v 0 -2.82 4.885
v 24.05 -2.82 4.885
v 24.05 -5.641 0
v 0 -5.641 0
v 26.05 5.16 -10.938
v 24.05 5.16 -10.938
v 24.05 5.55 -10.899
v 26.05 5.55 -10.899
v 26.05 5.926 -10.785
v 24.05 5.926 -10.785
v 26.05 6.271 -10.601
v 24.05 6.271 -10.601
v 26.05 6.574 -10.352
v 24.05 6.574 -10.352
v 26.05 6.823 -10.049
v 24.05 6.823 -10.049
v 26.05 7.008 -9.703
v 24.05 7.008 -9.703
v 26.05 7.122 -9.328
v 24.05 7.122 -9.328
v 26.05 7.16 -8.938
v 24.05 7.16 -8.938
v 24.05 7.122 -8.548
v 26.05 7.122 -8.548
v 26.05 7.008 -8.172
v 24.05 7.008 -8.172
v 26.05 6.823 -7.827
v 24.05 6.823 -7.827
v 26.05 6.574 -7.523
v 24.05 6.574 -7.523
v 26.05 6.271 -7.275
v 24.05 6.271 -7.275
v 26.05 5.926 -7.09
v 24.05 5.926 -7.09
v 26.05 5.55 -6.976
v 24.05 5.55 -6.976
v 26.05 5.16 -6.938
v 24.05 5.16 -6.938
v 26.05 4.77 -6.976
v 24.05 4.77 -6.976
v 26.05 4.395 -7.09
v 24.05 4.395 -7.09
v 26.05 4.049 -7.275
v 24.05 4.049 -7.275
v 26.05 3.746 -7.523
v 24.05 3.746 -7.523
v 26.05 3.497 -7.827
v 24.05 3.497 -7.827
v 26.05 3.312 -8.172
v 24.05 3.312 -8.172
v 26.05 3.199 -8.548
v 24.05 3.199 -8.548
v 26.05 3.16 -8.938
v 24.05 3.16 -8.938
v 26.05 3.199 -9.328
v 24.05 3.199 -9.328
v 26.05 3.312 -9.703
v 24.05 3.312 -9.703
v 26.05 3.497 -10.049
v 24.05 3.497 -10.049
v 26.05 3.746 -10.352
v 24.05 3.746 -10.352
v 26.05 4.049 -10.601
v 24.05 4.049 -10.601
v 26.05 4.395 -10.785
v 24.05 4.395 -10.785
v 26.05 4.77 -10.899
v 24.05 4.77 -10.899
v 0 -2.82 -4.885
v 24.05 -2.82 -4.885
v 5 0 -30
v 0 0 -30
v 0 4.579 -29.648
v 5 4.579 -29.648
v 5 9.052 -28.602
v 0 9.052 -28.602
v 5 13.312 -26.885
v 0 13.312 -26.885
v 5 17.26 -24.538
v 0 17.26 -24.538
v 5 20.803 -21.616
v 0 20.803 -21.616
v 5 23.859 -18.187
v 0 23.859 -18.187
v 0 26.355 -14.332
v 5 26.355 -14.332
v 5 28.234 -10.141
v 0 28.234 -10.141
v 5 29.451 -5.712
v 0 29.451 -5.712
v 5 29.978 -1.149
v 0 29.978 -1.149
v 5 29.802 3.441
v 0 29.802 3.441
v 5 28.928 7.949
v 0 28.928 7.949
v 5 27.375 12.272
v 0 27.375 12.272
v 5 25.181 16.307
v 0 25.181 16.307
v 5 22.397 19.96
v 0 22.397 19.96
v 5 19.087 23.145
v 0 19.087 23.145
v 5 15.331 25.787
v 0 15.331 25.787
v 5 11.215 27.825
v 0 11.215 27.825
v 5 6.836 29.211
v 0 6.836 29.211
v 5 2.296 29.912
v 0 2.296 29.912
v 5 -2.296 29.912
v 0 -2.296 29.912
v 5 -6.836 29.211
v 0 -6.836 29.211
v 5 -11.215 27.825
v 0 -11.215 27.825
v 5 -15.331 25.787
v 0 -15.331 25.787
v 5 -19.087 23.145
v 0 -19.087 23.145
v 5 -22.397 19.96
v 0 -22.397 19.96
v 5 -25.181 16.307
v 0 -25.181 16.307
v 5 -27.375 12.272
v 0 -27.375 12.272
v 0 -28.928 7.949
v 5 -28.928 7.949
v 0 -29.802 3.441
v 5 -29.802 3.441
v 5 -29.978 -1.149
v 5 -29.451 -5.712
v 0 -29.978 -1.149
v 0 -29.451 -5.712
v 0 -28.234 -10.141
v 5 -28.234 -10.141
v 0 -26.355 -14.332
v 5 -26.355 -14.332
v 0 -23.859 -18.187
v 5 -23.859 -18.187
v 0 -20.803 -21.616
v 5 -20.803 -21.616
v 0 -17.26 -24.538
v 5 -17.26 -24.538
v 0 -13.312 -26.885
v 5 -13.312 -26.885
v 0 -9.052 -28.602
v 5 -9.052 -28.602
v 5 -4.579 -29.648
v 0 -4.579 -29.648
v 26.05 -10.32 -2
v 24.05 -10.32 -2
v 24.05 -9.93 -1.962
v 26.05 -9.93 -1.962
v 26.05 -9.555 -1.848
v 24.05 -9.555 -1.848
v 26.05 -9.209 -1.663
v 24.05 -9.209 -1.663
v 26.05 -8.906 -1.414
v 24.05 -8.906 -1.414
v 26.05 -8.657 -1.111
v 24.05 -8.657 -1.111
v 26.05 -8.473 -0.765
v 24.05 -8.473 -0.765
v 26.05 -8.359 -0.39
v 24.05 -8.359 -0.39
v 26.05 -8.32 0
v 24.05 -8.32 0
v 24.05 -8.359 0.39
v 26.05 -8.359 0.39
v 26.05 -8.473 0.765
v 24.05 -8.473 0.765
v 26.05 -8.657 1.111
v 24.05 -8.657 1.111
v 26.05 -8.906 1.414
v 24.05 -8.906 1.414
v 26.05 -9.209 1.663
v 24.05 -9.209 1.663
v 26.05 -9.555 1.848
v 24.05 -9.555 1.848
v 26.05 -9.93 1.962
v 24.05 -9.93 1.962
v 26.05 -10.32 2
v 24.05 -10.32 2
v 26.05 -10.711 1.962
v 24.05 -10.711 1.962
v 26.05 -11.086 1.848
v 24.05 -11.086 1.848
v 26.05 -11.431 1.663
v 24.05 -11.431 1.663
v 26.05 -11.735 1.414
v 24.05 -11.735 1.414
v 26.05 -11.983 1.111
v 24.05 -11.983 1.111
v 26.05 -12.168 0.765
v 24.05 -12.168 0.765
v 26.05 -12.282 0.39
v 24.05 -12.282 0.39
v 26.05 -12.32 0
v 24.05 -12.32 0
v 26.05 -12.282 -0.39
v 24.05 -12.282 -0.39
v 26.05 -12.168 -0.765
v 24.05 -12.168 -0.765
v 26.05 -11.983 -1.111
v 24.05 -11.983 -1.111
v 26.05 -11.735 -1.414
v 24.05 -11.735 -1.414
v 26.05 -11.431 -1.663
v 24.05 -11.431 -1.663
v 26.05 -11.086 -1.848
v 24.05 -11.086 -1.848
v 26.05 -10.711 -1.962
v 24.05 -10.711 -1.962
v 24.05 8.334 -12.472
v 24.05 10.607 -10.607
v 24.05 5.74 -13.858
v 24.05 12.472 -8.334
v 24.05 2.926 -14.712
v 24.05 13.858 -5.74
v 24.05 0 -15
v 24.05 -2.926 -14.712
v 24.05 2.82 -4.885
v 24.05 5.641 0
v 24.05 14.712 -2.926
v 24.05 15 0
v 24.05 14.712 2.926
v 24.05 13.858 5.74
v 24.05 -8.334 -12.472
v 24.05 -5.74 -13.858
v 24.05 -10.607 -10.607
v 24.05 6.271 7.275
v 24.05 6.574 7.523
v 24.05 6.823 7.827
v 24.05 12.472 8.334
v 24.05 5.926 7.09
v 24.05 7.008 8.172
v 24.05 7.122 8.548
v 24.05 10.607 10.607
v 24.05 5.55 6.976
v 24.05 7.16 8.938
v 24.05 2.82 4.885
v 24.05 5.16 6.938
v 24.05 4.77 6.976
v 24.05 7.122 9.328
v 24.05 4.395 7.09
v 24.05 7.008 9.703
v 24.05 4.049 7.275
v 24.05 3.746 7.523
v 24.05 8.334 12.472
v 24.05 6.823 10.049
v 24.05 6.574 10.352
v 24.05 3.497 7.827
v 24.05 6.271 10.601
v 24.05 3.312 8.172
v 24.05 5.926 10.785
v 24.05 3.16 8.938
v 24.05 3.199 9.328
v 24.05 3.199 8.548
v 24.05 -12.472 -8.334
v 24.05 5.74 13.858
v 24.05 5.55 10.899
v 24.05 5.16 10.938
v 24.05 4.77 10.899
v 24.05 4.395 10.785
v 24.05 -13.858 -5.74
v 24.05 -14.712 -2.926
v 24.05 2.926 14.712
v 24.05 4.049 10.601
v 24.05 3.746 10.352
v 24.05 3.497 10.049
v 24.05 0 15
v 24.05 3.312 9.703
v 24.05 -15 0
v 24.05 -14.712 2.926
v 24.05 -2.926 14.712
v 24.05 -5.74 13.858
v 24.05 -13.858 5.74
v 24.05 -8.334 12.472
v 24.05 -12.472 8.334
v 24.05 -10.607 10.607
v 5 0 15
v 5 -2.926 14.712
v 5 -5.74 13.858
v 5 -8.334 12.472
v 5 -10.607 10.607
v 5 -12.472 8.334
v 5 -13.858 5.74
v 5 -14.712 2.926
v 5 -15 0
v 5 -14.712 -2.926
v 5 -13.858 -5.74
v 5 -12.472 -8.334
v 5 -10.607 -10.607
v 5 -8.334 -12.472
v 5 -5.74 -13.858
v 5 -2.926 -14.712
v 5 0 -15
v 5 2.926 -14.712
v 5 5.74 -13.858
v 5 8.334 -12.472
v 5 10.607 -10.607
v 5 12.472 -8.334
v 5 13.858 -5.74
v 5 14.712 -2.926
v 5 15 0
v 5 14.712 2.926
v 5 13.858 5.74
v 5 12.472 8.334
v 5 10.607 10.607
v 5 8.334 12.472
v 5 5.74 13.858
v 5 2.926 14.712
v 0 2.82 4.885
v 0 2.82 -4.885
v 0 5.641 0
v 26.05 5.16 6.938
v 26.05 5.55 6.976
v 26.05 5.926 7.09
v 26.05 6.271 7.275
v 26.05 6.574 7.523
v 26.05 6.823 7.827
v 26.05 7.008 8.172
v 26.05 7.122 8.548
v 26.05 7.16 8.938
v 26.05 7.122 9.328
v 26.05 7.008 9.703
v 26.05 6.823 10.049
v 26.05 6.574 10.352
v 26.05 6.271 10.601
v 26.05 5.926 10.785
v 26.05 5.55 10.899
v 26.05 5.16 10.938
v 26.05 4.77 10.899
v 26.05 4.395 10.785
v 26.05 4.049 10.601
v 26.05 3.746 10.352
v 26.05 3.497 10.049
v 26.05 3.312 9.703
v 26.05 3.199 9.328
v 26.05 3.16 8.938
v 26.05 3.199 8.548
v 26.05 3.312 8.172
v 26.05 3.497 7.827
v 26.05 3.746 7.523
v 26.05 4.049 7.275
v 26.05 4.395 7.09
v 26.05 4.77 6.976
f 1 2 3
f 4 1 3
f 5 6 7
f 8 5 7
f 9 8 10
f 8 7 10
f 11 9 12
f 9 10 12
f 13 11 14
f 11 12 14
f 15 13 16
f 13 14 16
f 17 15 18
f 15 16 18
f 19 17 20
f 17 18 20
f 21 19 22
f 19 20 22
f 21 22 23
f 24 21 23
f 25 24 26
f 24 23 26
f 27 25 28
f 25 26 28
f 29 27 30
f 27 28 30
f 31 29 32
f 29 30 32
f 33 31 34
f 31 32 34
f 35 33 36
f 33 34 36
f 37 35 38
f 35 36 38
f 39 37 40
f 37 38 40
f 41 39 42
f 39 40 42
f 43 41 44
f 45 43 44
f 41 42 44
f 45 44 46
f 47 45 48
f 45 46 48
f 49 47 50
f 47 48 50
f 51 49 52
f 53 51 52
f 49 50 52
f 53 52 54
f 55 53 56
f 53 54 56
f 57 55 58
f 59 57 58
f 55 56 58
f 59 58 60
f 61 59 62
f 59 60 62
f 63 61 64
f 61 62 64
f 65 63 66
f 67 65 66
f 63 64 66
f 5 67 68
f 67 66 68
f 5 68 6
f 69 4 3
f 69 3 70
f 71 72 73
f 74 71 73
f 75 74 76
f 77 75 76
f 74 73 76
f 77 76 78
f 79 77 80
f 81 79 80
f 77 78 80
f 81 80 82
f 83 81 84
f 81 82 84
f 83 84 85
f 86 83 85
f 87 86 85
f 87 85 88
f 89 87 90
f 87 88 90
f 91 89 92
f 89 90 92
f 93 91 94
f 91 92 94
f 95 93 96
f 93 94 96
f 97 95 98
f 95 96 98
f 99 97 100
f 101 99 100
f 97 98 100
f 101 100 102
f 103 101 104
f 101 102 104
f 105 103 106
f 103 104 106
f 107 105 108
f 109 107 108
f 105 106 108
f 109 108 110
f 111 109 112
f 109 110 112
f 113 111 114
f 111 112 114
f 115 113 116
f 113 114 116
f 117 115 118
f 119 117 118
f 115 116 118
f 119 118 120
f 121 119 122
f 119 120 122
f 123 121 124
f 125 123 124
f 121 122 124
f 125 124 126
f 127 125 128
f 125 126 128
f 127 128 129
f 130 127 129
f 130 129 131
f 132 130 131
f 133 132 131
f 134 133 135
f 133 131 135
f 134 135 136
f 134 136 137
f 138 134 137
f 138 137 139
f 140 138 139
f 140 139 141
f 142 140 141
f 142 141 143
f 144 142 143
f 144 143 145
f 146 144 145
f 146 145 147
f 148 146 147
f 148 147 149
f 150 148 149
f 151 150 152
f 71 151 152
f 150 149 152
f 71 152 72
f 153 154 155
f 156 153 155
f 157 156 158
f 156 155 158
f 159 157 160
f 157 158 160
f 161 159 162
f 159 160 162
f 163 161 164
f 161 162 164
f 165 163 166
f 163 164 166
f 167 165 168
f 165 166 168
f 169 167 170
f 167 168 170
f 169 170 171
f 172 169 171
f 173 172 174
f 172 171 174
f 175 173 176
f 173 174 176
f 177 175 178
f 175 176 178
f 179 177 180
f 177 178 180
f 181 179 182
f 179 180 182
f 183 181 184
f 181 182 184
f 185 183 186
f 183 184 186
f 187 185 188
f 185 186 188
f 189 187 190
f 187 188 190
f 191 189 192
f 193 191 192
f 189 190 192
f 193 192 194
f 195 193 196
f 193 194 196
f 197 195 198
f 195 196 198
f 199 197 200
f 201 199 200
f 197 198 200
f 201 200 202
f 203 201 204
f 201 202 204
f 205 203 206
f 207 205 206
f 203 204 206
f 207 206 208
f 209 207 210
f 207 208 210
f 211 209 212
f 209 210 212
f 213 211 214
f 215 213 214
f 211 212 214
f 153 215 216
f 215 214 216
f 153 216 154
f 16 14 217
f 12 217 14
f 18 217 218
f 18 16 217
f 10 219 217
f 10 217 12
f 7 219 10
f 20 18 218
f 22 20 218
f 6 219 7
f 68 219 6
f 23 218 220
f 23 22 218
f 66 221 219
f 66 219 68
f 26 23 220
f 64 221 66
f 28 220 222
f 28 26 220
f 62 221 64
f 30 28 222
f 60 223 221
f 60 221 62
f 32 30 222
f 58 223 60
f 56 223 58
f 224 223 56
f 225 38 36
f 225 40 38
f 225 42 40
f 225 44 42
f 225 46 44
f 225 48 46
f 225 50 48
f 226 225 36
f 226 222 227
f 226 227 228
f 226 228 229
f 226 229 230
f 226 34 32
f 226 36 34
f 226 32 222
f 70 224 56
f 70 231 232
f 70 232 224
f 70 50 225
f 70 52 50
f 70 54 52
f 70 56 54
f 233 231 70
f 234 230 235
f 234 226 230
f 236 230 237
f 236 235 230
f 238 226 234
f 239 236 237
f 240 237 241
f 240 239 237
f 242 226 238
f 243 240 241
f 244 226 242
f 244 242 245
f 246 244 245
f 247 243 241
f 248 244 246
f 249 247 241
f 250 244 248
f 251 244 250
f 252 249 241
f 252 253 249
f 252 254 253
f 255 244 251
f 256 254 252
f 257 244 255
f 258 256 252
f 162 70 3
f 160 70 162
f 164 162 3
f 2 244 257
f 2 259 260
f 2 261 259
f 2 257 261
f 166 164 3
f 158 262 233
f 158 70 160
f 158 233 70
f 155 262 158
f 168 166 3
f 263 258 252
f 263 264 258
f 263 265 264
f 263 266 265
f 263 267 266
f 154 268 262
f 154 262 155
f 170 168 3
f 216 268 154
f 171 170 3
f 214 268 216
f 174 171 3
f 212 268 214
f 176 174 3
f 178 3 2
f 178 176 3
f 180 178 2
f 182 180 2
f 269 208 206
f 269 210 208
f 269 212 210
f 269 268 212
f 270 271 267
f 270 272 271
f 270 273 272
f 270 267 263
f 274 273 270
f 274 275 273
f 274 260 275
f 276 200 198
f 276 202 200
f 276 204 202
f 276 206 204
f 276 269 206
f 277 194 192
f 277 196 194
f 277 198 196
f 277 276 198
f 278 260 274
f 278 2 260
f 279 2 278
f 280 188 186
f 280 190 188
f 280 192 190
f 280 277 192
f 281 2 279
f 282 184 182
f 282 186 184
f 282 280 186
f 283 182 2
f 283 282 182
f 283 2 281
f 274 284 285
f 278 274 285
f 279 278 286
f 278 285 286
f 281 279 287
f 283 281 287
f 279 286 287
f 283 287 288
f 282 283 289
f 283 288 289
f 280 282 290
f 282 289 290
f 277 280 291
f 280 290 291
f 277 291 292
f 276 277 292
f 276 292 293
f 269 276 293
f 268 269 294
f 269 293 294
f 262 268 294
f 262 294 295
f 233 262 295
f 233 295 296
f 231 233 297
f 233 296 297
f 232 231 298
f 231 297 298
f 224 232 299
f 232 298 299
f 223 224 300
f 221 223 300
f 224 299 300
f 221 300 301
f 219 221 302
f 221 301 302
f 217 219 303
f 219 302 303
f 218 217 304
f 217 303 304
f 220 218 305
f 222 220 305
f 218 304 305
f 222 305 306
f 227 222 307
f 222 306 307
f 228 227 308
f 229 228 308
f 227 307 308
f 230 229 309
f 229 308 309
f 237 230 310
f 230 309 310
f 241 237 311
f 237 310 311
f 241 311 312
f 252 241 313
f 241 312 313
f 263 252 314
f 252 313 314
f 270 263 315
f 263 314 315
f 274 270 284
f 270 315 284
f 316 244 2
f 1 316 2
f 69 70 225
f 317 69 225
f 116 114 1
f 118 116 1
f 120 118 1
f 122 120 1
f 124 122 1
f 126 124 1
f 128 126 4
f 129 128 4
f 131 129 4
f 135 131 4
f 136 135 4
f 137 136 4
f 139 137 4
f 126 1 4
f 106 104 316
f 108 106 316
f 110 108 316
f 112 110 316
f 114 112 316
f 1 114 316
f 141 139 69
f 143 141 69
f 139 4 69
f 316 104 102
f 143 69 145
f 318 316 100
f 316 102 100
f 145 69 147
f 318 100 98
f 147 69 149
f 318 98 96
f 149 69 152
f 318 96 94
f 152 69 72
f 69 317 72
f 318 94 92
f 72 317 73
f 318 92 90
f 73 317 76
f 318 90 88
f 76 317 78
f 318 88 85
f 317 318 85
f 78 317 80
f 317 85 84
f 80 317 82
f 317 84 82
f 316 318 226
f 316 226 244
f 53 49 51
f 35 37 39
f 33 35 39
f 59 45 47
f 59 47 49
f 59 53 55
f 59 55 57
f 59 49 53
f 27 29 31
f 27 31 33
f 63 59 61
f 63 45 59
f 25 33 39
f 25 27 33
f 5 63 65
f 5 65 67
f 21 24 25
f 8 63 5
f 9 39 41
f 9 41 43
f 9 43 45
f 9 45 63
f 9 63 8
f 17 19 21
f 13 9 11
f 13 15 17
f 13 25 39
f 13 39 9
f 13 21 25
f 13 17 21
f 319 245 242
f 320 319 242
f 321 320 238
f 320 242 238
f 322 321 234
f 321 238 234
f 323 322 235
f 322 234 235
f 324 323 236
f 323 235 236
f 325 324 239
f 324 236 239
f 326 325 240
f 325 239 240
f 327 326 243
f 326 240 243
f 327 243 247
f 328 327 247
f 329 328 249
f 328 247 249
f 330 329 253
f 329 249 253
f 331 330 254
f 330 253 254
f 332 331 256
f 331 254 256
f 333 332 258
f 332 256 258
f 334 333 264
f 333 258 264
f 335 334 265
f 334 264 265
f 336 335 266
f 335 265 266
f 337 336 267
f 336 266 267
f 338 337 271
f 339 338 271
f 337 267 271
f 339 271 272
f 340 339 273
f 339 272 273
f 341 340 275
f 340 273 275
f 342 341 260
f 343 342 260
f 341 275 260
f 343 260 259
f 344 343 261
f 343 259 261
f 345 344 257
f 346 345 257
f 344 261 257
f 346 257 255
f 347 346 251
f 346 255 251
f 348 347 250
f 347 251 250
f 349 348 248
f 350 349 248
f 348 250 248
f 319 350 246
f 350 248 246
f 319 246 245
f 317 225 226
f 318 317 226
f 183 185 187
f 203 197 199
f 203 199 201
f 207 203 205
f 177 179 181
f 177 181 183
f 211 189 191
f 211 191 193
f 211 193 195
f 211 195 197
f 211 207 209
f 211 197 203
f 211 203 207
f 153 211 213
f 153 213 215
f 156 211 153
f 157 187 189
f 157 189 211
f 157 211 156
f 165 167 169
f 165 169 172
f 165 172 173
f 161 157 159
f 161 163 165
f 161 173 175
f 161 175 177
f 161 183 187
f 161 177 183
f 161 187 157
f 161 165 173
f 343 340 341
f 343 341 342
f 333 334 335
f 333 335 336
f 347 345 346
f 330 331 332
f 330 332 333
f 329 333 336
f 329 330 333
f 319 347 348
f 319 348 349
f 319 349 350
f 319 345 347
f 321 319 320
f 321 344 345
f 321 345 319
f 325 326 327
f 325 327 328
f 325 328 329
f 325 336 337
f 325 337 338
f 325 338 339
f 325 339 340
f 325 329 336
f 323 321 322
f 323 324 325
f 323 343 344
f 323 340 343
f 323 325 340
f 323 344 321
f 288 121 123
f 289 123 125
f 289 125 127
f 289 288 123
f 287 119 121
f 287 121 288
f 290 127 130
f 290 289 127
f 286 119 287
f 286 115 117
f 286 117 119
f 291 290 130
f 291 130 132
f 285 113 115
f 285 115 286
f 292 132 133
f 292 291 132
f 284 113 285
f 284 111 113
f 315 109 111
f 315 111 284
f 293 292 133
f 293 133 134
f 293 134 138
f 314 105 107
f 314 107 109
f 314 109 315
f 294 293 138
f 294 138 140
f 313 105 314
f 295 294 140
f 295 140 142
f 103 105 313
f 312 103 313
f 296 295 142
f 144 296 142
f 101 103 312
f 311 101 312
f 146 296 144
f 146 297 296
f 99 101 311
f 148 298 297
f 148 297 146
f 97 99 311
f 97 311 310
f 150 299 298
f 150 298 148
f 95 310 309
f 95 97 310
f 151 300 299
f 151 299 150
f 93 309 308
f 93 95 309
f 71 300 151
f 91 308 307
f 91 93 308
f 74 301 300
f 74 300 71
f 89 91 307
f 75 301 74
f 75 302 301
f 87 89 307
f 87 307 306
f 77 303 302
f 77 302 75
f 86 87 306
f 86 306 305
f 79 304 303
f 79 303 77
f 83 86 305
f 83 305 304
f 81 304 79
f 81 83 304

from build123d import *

# Parameters (mm, degrees)
SKETCH2_R           = 30
BOSS_EXTRUDE1_DEPTH = 5
SKETCH3_R           = 15
BOSS_EXTRUDE2_DEPTH = 19.05
CUT_EXTRUDE1_DEPTH  = 24.05
SKETCH5_R           = 2
BOSS_EXTRUDE3_DEPTH = 2


with BuildPart() as part:
    # Sketch2 → Boss-Extrude1 (new body)
    with BuildSketch(Plane(origin=(0, 0, 0), x_dir=(0, 0, -1), z_dir=(1, 0, 0))):
        Circle(SKETCH2_R)
    extrude(amount=BOSS_EXTRUDE1_DEPTH)

    # Sketch3 → Boss-Extrude2 (add)
    with BuildSketch(Plane(origin=(5, 0, 0), x_dir=(0, 0, -1), z_dir=(1, 0, 0))):
        with Locations(Location((0, 0, 0), (0, 0, 180))):
            Circle(SKETCH3_R)
    extrude(amount=BOSS_EXTRUDE2_DEPTH)

    # Sketch4 → Cut-Extrude1 (cut)
    with BuildSketch(Plane(origin=(24.05, 0, 0), x_dir=(0, 0, -1), z_dir=(1, 0, 0))):
        Polygon((0, 5.64071213), (-4.885, 2.820356065), (-4.885, -2.820356065), (0, -5.64071213), (4.885, -2.820356065), (4.885, 2.820356065), align=None)
    extrude(amount=-CUT_EXTRUDE1_DEPTH, mode=Mode.SUBTRACT)

    # Sketch5 → Boss-Extrude3 (add)
    with BuildSketch(Plane(origin=(24.05, 0, 0), x_dir=(0, 0, -1), z_dir=(1, 0, 0))):
        with Locations((8.937690528, 5.160178032)):
            Circle(SKETCH5_R)
        with Locations((-8.937690528, 5.160178032)):
            Circle(SKETCH5_R)
        with Locations((0, -10.320356065)):
            Circle(SKETCH5_R)
    extrude(amount=BOSS_EXTRUDE3_DEPTH)


solid = part.part
